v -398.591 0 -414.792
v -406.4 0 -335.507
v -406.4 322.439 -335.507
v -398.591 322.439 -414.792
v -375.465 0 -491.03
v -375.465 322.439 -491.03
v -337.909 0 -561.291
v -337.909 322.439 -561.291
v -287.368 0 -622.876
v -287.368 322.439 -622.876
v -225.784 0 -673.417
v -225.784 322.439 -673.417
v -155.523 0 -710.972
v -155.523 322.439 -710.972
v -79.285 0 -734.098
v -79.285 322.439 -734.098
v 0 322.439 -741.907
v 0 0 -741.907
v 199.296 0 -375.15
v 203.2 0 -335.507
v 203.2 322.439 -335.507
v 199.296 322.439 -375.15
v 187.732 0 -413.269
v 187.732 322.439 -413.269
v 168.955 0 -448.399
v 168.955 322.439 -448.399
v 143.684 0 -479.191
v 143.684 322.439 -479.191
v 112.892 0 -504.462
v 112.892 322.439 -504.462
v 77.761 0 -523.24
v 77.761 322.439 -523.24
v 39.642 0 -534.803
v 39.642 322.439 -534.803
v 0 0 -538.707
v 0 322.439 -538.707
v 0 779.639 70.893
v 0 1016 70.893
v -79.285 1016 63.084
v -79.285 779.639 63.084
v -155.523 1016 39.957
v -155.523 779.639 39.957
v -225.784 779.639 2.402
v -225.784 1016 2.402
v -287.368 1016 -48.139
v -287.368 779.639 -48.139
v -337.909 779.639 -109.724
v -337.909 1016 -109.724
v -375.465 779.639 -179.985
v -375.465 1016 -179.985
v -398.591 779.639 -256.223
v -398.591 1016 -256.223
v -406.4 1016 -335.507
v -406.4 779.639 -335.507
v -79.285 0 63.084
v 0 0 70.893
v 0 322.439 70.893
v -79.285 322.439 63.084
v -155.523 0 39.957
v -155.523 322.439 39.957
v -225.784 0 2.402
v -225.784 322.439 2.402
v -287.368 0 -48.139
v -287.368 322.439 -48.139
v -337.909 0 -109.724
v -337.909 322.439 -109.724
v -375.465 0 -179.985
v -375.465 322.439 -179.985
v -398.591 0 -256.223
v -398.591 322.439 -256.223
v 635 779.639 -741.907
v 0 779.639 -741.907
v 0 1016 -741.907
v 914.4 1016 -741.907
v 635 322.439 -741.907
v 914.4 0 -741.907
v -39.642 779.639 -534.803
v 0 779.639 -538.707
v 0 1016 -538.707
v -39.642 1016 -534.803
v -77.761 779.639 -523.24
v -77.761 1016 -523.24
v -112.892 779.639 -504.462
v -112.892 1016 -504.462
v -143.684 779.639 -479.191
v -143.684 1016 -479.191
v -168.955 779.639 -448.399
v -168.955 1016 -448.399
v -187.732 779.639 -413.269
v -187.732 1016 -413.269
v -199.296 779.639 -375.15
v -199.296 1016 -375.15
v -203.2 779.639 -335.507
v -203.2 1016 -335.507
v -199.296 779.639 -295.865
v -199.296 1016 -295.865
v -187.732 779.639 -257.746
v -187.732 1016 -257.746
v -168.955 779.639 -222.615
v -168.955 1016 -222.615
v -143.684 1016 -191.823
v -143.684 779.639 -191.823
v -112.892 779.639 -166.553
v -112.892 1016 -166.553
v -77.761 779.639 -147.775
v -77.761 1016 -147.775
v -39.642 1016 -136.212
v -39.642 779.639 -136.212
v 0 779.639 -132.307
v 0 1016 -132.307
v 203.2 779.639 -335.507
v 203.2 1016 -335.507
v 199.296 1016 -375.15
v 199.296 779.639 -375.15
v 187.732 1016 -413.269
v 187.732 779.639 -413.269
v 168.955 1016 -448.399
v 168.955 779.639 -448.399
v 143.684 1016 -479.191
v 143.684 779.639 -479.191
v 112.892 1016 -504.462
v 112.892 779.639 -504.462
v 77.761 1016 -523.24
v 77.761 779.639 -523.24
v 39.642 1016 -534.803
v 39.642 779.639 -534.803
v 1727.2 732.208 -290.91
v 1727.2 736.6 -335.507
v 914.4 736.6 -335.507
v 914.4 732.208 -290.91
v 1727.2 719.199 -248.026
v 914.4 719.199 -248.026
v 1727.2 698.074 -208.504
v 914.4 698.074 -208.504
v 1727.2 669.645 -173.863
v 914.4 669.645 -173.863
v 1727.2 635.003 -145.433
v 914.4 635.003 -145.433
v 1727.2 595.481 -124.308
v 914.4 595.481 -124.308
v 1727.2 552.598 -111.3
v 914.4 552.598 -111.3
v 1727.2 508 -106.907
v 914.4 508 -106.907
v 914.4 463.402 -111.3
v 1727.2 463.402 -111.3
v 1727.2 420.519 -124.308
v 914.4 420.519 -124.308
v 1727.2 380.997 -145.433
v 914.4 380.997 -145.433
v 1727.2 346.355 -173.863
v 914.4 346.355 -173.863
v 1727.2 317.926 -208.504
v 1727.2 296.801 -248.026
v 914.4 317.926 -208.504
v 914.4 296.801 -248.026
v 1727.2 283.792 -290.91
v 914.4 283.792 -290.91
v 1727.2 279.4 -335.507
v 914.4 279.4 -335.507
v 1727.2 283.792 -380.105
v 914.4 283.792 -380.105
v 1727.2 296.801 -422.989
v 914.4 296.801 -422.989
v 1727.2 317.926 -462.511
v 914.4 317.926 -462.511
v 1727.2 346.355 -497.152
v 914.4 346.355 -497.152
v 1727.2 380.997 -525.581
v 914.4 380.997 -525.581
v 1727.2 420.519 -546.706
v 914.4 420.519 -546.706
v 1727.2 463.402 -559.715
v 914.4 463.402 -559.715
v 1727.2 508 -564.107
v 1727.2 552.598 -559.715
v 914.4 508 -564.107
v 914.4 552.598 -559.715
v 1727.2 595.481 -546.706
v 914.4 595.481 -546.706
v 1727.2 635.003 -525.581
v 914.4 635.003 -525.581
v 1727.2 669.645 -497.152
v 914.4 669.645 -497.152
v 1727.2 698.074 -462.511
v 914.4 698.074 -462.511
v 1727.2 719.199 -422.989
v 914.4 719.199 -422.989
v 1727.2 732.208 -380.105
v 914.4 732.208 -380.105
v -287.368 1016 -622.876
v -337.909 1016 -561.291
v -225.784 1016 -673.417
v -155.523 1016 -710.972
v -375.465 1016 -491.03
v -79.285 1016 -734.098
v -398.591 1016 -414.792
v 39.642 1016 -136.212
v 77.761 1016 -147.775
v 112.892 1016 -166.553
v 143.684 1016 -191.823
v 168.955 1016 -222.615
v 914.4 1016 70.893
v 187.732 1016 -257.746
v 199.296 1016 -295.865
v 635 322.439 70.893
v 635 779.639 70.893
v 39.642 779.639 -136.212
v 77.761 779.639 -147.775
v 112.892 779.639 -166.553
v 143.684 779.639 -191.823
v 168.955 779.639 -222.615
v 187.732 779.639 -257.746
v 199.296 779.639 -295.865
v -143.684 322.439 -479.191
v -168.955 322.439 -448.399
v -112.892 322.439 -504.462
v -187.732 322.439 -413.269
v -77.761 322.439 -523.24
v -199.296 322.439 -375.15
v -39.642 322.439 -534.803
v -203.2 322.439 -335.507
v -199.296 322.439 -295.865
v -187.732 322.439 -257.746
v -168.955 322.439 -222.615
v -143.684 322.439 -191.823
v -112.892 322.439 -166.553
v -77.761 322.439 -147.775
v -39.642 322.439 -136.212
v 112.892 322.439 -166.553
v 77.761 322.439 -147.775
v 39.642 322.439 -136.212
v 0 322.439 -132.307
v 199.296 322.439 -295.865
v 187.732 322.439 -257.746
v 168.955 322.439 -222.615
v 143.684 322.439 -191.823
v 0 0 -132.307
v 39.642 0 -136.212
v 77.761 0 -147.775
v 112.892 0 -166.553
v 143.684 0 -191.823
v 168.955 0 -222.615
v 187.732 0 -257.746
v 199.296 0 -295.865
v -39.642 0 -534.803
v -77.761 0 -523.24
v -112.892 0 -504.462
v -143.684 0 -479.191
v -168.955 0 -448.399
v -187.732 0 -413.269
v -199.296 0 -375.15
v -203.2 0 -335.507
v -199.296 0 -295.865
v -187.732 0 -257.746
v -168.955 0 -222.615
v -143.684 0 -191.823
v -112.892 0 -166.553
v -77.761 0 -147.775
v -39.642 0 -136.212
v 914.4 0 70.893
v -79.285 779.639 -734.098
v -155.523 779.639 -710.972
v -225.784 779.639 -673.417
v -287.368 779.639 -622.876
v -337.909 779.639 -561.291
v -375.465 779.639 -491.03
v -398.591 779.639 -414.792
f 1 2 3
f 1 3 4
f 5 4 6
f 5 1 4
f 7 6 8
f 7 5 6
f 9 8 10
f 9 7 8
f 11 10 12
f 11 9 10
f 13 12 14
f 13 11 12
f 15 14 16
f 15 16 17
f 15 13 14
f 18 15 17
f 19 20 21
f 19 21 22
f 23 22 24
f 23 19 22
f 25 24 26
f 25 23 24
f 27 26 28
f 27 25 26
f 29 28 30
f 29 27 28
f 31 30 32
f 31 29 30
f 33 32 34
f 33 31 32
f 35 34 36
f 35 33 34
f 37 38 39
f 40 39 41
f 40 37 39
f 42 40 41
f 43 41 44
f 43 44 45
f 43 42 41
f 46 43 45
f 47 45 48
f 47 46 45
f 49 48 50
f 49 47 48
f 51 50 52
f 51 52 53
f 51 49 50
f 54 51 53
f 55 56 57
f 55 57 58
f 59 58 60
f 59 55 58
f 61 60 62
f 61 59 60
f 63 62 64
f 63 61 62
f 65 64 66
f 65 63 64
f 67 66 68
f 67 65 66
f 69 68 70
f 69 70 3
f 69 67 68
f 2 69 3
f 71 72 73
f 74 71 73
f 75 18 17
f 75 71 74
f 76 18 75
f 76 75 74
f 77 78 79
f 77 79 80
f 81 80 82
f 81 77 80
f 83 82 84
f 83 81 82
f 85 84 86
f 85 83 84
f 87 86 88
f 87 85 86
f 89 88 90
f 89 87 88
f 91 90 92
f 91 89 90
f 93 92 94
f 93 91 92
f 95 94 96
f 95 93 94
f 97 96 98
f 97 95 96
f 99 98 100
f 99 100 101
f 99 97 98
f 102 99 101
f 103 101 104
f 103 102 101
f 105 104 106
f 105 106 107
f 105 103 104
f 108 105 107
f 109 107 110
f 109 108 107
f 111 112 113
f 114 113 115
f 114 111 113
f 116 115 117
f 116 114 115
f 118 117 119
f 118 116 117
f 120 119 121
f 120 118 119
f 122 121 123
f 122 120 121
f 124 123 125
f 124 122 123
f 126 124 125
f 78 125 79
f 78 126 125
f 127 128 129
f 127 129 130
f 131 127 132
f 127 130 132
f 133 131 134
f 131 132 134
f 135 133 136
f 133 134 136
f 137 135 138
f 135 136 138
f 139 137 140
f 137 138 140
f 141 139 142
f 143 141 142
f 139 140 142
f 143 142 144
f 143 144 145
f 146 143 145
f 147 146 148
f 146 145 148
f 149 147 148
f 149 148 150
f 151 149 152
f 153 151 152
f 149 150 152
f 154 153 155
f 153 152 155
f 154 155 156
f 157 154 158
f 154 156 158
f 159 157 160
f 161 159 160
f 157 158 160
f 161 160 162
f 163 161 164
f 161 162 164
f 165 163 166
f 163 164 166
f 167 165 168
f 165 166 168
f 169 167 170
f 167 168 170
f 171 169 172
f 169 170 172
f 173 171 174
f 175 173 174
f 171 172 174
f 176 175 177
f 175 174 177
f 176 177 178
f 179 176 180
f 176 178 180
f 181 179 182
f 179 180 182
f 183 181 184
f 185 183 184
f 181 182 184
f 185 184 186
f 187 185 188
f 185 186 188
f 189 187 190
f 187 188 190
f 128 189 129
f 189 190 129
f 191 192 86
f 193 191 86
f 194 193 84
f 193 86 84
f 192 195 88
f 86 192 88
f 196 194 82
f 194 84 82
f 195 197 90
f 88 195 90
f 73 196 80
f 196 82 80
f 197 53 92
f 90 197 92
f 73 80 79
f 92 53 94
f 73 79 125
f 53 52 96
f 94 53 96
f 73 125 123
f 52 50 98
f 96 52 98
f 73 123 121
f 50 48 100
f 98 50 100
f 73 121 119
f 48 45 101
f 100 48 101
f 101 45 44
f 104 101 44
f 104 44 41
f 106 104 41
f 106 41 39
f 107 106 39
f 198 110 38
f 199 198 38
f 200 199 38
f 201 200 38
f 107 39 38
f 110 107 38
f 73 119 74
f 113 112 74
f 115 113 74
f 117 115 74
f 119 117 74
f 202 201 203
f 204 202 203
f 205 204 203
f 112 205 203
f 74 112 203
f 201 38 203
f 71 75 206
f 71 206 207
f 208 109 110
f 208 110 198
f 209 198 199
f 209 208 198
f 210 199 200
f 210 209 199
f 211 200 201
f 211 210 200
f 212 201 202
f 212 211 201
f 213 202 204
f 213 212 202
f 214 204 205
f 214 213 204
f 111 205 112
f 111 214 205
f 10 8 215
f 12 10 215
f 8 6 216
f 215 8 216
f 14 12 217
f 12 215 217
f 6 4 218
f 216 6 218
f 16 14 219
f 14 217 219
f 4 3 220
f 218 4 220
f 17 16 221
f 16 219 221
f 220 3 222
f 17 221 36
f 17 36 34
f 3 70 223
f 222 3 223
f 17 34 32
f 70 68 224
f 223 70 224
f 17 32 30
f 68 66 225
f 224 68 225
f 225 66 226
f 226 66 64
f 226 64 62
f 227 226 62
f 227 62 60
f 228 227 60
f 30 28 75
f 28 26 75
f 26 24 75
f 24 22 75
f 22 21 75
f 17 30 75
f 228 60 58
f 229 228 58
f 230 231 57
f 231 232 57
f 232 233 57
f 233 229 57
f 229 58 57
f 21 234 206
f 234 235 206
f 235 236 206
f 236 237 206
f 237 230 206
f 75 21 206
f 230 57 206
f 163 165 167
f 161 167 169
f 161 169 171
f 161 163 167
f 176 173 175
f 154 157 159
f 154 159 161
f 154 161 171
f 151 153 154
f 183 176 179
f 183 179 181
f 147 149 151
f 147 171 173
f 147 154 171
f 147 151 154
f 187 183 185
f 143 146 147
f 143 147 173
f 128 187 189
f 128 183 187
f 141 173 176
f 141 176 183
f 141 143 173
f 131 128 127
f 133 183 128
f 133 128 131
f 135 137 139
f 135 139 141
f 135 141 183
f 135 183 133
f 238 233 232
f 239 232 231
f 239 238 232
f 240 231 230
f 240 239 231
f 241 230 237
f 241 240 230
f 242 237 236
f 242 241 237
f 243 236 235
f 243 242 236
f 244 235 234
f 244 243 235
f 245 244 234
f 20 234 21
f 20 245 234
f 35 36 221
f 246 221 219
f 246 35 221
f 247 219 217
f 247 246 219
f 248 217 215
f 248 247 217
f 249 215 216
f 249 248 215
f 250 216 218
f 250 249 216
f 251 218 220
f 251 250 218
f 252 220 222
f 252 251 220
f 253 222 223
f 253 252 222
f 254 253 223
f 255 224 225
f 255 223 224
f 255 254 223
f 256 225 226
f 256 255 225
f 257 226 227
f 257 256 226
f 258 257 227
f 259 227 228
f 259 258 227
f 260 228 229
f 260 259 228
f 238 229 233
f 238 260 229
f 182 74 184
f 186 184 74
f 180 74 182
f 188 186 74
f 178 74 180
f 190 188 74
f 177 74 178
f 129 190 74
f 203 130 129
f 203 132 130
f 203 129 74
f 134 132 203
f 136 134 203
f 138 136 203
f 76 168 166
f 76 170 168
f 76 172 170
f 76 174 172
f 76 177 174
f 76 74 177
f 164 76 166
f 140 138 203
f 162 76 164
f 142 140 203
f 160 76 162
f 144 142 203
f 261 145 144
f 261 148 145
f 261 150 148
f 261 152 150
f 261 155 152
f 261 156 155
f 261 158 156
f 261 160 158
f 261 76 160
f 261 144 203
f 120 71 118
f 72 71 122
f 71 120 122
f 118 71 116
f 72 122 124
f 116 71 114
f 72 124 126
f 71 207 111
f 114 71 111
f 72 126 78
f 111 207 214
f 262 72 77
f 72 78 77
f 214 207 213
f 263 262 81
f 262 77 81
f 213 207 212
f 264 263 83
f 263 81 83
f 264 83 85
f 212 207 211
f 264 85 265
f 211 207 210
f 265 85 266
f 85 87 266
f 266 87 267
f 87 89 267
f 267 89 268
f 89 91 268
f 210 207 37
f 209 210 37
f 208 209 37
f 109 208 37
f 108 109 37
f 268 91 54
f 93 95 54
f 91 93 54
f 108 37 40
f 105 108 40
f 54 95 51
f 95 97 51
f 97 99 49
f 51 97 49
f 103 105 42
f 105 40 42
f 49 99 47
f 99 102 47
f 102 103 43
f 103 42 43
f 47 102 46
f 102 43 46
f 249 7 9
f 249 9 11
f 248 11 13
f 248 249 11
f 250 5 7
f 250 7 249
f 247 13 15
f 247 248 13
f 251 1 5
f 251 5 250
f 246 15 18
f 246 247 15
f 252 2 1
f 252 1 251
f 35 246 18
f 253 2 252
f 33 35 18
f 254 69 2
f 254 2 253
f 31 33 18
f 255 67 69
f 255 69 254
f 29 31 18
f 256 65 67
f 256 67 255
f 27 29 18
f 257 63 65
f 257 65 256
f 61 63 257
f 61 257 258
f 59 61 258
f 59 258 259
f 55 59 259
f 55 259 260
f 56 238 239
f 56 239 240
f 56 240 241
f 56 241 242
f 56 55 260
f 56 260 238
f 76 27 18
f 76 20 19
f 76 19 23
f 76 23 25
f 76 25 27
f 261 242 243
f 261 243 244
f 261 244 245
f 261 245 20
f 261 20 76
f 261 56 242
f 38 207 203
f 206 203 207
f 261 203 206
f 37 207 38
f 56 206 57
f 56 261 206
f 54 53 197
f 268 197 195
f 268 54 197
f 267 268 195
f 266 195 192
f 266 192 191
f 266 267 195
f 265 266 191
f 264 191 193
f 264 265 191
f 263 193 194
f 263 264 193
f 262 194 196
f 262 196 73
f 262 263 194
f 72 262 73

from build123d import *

# Parameters (mm, degrees)
F1_DEPTH = 1016
F2_W     = 406.4
F2_H     = 457.2
F2_W_2   = 635
F3_DEPTH = 812.801
F4_R     = 228.6
F5_DEPTH = 812.8


with BuildPart() as f1:
    # F0 (on Front) → F1 (new body)
    with BuildSketch(Plane.XZ):
        with BuildLine():
            Line((914.4, 70.892677), (0, 70.892677))
            Line((0, 70.892677), (0, -132.307323))
            ThreePointArc((0, -132.307323), (143.684098, -191.823225), (203.2, -335.507323))
            ThreePointArc((203.2, -335.507323), (143.684098, -479.191421), (0, -538.707323))
            Line((0, -538.707323), (0, -741.907323))
            Line((0, -741.907323), (914.4, -741.907323))
            Line((914.4, -741.907323), (914.4, 70.892677))
        make_face()
        with BuildLine():
            Line((0, -132.307323), (0, 70.892677))
            ThreePointArc((0, 70.892677), (-287.368196, -48.139127), (-406.4, -335.507323))
            ThreePointArc((-406.4, -335.507323), (-287.368196, -622.875519), (0, -741.907323))
            Line((0, -741.907323), (0, -538.707323))
            ThreePointArc((0, -538.707323), (-203.2, -335.507323), (0, -132.307323))
        make_face()
    extrude(amount=-F1_DEPTH)

    # F2 (on face) → F3 (cut, through all)
    with BuildSketch(Plane.XY.offset(70.892677)):
        with Locations((-203.2, 551.038588)):
            Rectangle(F2_W, F2_H)
        with Locations((317.5, 551.038588)):
            Rectangle(F2_W_2, F2_H)
    extrude(amount=-F3_DEPTH, mode=Mode.SUBTRACT)

    # F4 (on face) → F5 (join)
    with BuildSketch(Plane.YZ.offset(914.4)):
        with Locations((508, -335.507323)):
            Circle(F4_R)
    extrude(amount=F5_DEPTH)


solid = f1.part
